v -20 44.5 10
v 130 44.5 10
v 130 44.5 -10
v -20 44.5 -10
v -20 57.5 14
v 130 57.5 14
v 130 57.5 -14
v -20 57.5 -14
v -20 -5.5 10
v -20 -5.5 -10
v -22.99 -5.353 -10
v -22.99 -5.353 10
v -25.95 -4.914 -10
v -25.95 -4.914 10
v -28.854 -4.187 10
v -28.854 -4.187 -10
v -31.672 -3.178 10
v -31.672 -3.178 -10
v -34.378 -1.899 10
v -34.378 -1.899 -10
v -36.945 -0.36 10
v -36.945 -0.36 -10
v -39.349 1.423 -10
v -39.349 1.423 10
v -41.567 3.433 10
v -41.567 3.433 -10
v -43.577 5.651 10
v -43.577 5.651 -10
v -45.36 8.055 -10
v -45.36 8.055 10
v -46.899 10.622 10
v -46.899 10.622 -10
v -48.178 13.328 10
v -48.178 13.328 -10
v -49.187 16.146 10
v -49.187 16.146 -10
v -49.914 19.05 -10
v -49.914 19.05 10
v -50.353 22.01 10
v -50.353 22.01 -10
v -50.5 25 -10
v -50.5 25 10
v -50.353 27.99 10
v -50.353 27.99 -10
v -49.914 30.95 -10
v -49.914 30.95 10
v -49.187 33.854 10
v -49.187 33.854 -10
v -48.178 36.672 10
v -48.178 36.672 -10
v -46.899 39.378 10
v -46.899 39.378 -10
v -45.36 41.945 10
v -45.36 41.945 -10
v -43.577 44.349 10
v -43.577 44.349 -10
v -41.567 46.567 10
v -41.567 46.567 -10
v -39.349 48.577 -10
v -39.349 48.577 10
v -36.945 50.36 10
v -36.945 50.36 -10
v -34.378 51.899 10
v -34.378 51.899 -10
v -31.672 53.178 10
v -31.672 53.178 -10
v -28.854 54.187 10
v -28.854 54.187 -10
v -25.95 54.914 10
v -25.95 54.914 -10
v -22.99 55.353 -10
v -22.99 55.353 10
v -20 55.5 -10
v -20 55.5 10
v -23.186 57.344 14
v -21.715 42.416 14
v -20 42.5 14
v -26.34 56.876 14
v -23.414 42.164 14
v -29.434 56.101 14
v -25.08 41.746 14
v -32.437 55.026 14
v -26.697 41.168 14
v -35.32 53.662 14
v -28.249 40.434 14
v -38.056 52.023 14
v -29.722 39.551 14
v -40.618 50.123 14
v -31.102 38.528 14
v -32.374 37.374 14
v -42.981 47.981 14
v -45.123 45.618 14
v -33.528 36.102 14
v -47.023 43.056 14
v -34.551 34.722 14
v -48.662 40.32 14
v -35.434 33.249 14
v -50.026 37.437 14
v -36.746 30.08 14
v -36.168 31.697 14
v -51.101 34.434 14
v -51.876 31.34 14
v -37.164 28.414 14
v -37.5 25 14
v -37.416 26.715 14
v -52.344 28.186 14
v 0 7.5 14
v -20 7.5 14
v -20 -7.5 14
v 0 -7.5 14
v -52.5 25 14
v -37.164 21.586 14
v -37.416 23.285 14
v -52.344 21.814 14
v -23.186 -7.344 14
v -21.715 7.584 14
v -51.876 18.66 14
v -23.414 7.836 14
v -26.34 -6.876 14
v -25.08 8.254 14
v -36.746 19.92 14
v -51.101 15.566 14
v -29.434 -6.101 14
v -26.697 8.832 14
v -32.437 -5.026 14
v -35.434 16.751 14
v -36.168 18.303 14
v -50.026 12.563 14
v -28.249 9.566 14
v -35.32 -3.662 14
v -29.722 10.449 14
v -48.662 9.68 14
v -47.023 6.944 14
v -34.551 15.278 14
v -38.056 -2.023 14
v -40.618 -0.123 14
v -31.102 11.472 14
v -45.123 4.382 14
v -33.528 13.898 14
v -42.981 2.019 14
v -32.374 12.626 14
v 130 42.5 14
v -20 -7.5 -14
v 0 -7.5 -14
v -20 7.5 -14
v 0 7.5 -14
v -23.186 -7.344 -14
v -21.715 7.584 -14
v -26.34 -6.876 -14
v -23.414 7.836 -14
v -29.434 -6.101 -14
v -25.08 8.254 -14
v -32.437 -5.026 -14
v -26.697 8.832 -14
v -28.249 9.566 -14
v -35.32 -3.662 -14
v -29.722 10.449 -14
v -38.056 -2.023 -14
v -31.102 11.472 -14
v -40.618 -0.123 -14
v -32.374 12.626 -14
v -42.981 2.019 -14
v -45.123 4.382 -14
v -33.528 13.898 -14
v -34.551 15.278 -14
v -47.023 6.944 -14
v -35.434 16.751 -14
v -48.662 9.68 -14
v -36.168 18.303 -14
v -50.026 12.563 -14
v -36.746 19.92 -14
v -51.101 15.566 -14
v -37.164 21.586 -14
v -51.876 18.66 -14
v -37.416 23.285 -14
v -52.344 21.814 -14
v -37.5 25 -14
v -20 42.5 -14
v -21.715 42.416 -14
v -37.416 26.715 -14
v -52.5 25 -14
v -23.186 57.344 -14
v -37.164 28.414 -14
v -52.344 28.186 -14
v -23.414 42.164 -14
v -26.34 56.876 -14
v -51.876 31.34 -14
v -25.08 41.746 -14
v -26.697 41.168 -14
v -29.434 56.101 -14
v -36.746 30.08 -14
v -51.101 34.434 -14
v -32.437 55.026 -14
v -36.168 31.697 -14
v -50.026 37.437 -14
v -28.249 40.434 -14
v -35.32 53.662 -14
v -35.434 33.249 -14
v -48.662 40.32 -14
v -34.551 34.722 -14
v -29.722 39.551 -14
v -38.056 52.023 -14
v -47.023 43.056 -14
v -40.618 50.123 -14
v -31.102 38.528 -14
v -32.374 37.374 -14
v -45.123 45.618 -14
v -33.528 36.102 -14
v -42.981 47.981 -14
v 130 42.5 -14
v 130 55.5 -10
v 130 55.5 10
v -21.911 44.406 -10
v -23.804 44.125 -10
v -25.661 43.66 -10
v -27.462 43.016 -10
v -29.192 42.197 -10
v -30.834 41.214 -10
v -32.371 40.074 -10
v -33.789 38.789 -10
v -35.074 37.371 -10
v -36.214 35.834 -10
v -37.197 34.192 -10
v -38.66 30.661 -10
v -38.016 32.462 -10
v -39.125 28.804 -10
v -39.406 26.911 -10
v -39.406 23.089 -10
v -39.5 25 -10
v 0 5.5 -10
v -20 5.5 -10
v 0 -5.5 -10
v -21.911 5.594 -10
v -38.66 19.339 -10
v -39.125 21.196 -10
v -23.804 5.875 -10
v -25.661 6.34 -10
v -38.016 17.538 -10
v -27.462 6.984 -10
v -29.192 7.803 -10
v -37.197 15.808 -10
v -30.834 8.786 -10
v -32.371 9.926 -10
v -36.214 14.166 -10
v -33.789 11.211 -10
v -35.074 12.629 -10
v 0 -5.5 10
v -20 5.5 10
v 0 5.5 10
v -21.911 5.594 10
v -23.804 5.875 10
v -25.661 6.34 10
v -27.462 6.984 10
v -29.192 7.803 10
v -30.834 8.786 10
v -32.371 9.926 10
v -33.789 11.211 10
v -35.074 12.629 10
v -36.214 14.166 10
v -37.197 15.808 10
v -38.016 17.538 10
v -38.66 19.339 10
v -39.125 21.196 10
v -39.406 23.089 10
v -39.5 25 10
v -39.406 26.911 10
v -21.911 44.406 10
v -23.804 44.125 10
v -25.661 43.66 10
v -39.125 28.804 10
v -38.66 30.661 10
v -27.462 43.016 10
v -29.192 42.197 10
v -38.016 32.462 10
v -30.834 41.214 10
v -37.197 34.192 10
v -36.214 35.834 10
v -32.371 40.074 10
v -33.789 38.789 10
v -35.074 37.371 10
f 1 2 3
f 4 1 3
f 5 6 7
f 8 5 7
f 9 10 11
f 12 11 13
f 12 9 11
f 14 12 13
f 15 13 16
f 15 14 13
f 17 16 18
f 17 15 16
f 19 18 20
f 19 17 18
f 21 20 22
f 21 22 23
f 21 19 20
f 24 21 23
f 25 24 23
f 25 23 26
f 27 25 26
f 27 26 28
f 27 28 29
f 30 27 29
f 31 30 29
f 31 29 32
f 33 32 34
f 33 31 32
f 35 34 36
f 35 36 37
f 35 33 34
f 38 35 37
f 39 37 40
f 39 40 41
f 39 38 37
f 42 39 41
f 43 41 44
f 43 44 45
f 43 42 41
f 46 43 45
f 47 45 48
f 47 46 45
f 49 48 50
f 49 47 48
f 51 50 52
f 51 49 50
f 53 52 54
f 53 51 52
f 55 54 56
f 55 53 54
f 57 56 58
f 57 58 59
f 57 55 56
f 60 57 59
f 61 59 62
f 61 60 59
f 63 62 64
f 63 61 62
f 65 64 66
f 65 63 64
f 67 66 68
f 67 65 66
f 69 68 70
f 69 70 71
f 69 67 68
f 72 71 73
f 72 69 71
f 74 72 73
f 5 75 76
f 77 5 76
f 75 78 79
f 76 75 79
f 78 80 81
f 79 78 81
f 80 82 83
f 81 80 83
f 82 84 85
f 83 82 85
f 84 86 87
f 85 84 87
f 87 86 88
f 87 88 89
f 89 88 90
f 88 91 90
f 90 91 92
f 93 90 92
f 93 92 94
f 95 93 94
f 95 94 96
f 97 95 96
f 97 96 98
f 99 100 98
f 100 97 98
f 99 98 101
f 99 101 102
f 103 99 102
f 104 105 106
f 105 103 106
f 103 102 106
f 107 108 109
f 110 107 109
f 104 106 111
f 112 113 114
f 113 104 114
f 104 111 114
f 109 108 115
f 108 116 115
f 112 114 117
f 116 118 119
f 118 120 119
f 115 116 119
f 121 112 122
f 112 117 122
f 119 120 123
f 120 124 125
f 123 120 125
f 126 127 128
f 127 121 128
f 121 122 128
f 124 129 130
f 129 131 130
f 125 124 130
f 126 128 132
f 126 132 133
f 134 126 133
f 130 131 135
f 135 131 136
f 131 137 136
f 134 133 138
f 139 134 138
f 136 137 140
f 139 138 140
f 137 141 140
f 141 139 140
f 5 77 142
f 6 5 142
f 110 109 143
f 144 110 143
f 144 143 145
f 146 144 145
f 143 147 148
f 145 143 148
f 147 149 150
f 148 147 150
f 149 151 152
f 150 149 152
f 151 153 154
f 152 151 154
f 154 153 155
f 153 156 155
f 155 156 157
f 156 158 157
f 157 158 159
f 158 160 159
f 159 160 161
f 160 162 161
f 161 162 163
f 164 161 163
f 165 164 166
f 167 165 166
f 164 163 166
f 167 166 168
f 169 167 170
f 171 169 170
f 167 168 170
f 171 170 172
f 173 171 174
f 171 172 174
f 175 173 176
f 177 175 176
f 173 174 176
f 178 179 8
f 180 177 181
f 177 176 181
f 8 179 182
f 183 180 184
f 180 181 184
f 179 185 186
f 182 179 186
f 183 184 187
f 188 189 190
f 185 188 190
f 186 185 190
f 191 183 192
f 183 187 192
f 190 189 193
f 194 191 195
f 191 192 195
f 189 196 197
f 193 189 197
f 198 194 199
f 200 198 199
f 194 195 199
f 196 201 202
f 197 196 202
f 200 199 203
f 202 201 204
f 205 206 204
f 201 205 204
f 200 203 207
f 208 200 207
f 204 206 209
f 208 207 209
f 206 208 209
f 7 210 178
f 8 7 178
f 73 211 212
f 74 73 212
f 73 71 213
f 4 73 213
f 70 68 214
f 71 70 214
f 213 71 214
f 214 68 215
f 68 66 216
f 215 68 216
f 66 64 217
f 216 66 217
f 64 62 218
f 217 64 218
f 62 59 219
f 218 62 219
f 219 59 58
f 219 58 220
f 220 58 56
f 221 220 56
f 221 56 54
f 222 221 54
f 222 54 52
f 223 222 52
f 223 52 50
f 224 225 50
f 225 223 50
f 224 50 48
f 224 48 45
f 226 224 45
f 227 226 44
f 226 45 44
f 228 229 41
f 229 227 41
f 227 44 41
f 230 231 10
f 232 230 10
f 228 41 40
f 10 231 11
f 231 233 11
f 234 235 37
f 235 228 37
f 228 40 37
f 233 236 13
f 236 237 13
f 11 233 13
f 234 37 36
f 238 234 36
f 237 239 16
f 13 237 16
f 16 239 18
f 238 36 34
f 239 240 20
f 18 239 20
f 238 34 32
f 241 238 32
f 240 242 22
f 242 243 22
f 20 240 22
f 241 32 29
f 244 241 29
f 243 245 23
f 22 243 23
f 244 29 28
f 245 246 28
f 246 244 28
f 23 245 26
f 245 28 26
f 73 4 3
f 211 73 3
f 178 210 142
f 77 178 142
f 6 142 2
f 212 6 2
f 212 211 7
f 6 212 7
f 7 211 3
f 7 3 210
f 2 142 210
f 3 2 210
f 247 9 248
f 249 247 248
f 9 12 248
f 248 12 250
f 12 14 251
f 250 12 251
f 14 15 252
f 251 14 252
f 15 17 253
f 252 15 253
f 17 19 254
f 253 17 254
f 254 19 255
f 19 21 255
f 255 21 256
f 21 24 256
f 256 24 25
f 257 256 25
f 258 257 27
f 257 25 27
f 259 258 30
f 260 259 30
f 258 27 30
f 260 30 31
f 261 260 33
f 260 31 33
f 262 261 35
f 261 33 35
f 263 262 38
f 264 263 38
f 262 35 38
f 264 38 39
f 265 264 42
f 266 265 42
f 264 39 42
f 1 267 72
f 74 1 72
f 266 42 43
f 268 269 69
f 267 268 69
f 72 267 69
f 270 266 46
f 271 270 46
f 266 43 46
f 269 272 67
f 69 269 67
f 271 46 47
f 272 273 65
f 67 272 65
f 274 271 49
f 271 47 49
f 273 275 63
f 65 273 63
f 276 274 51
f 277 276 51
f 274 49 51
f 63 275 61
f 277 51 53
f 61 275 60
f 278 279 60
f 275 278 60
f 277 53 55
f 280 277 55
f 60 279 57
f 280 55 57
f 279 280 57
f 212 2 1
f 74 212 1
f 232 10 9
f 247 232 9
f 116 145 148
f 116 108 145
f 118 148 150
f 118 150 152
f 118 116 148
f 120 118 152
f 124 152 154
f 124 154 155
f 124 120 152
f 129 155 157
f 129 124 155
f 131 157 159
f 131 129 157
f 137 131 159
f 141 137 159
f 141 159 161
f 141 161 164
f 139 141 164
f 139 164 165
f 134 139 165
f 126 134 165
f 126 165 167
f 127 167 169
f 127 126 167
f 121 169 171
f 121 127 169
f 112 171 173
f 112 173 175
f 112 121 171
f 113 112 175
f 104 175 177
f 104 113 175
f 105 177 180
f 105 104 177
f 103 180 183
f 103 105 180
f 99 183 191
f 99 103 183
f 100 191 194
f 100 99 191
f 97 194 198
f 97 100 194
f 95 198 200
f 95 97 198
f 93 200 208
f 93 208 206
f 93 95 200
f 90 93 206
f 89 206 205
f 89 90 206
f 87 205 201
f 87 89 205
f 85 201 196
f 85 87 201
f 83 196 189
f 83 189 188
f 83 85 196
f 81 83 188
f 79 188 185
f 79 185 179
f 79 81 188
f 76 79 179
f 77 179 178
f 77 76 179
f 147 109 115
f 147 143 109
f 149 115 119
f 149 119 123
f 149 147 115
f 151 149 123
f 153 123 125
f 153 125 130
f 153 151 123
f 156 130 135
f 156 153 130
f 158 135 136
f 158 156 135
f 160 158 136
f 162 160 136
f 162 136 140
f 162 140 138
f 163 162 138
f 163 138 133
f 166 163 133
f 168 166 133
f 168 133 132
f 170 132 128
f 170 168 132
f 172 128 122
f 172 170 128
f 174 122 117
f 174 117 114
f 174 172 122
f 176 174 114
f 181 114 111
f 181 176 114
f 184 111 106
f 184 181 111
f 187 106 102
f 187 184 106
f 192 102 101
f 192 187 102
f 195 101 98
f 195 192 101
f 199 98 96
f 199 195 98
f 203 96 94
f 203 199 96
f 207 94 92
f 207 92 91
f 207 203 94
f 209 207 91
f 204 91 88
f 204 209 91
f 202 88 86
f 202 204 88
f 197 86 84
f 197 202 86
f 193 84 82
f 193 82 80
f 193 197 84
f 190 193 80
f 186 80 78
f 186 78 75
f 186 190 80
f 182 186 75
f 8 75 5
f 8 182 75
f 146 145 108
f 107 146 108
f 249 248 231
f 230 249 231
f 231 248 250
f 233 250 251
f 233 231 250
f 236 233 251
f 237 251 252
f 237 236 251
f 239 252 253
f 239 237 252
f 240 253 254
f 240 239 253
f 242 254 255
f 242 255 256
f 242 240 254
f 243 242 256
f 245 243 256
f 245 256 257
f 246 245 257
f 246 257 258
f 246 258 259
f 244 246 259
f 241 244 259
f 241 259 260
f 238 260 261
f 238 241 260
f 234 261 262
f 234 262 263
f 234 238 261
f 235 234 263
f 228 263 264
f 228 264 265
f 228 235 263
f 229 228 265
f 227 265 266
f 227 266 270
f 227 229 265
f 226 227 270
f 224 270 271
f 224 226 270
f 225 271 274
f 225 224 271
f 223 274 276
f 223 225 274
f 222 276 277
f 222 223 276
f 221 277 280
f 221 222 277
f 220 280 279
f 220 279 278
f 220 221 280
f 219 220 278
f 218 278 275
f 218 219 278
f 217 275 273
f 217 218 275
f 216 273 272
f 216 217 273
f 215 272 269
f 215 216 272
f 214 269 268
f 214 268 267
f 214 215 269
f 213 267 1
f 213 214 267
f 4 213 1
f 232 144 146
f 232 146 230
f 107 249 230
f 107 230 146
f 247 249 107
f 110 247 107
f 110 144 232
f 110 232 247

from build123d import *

# Parameters (mm, degrees)
SKETCH2_W   = 28
SKETCH2_H   = 15
SKETCH2_W_2 = 20
SKETCH2_H_2 = 11


with BuildPart() as part:
    # Sweep1: sweep along a path in Sketch1
    with BuildLine(Plane.XY) as sweep1_path:
        Line((0, 0), (-20, 0))
        ThreePointArc((-20, 0), (-45, 25), (-20, 50))
        Line((-20, 50), (130, 50))
    # Sketch2 → Sweep1 (sweep)
    with BuildSketch(Plane(origin=(0, 0, 0), x_dir=(0, 0, -1), z_dir=(1, 0, 0))):
        Rectangle(SKETCH2_W, SKETCH2_H)
        Rectangle(SKETCH2_W_2, SKETCH2_H_2, mode=Mode.SUBTRACT)
    sweep(path=sweep1_path.line)


solid = part.part
